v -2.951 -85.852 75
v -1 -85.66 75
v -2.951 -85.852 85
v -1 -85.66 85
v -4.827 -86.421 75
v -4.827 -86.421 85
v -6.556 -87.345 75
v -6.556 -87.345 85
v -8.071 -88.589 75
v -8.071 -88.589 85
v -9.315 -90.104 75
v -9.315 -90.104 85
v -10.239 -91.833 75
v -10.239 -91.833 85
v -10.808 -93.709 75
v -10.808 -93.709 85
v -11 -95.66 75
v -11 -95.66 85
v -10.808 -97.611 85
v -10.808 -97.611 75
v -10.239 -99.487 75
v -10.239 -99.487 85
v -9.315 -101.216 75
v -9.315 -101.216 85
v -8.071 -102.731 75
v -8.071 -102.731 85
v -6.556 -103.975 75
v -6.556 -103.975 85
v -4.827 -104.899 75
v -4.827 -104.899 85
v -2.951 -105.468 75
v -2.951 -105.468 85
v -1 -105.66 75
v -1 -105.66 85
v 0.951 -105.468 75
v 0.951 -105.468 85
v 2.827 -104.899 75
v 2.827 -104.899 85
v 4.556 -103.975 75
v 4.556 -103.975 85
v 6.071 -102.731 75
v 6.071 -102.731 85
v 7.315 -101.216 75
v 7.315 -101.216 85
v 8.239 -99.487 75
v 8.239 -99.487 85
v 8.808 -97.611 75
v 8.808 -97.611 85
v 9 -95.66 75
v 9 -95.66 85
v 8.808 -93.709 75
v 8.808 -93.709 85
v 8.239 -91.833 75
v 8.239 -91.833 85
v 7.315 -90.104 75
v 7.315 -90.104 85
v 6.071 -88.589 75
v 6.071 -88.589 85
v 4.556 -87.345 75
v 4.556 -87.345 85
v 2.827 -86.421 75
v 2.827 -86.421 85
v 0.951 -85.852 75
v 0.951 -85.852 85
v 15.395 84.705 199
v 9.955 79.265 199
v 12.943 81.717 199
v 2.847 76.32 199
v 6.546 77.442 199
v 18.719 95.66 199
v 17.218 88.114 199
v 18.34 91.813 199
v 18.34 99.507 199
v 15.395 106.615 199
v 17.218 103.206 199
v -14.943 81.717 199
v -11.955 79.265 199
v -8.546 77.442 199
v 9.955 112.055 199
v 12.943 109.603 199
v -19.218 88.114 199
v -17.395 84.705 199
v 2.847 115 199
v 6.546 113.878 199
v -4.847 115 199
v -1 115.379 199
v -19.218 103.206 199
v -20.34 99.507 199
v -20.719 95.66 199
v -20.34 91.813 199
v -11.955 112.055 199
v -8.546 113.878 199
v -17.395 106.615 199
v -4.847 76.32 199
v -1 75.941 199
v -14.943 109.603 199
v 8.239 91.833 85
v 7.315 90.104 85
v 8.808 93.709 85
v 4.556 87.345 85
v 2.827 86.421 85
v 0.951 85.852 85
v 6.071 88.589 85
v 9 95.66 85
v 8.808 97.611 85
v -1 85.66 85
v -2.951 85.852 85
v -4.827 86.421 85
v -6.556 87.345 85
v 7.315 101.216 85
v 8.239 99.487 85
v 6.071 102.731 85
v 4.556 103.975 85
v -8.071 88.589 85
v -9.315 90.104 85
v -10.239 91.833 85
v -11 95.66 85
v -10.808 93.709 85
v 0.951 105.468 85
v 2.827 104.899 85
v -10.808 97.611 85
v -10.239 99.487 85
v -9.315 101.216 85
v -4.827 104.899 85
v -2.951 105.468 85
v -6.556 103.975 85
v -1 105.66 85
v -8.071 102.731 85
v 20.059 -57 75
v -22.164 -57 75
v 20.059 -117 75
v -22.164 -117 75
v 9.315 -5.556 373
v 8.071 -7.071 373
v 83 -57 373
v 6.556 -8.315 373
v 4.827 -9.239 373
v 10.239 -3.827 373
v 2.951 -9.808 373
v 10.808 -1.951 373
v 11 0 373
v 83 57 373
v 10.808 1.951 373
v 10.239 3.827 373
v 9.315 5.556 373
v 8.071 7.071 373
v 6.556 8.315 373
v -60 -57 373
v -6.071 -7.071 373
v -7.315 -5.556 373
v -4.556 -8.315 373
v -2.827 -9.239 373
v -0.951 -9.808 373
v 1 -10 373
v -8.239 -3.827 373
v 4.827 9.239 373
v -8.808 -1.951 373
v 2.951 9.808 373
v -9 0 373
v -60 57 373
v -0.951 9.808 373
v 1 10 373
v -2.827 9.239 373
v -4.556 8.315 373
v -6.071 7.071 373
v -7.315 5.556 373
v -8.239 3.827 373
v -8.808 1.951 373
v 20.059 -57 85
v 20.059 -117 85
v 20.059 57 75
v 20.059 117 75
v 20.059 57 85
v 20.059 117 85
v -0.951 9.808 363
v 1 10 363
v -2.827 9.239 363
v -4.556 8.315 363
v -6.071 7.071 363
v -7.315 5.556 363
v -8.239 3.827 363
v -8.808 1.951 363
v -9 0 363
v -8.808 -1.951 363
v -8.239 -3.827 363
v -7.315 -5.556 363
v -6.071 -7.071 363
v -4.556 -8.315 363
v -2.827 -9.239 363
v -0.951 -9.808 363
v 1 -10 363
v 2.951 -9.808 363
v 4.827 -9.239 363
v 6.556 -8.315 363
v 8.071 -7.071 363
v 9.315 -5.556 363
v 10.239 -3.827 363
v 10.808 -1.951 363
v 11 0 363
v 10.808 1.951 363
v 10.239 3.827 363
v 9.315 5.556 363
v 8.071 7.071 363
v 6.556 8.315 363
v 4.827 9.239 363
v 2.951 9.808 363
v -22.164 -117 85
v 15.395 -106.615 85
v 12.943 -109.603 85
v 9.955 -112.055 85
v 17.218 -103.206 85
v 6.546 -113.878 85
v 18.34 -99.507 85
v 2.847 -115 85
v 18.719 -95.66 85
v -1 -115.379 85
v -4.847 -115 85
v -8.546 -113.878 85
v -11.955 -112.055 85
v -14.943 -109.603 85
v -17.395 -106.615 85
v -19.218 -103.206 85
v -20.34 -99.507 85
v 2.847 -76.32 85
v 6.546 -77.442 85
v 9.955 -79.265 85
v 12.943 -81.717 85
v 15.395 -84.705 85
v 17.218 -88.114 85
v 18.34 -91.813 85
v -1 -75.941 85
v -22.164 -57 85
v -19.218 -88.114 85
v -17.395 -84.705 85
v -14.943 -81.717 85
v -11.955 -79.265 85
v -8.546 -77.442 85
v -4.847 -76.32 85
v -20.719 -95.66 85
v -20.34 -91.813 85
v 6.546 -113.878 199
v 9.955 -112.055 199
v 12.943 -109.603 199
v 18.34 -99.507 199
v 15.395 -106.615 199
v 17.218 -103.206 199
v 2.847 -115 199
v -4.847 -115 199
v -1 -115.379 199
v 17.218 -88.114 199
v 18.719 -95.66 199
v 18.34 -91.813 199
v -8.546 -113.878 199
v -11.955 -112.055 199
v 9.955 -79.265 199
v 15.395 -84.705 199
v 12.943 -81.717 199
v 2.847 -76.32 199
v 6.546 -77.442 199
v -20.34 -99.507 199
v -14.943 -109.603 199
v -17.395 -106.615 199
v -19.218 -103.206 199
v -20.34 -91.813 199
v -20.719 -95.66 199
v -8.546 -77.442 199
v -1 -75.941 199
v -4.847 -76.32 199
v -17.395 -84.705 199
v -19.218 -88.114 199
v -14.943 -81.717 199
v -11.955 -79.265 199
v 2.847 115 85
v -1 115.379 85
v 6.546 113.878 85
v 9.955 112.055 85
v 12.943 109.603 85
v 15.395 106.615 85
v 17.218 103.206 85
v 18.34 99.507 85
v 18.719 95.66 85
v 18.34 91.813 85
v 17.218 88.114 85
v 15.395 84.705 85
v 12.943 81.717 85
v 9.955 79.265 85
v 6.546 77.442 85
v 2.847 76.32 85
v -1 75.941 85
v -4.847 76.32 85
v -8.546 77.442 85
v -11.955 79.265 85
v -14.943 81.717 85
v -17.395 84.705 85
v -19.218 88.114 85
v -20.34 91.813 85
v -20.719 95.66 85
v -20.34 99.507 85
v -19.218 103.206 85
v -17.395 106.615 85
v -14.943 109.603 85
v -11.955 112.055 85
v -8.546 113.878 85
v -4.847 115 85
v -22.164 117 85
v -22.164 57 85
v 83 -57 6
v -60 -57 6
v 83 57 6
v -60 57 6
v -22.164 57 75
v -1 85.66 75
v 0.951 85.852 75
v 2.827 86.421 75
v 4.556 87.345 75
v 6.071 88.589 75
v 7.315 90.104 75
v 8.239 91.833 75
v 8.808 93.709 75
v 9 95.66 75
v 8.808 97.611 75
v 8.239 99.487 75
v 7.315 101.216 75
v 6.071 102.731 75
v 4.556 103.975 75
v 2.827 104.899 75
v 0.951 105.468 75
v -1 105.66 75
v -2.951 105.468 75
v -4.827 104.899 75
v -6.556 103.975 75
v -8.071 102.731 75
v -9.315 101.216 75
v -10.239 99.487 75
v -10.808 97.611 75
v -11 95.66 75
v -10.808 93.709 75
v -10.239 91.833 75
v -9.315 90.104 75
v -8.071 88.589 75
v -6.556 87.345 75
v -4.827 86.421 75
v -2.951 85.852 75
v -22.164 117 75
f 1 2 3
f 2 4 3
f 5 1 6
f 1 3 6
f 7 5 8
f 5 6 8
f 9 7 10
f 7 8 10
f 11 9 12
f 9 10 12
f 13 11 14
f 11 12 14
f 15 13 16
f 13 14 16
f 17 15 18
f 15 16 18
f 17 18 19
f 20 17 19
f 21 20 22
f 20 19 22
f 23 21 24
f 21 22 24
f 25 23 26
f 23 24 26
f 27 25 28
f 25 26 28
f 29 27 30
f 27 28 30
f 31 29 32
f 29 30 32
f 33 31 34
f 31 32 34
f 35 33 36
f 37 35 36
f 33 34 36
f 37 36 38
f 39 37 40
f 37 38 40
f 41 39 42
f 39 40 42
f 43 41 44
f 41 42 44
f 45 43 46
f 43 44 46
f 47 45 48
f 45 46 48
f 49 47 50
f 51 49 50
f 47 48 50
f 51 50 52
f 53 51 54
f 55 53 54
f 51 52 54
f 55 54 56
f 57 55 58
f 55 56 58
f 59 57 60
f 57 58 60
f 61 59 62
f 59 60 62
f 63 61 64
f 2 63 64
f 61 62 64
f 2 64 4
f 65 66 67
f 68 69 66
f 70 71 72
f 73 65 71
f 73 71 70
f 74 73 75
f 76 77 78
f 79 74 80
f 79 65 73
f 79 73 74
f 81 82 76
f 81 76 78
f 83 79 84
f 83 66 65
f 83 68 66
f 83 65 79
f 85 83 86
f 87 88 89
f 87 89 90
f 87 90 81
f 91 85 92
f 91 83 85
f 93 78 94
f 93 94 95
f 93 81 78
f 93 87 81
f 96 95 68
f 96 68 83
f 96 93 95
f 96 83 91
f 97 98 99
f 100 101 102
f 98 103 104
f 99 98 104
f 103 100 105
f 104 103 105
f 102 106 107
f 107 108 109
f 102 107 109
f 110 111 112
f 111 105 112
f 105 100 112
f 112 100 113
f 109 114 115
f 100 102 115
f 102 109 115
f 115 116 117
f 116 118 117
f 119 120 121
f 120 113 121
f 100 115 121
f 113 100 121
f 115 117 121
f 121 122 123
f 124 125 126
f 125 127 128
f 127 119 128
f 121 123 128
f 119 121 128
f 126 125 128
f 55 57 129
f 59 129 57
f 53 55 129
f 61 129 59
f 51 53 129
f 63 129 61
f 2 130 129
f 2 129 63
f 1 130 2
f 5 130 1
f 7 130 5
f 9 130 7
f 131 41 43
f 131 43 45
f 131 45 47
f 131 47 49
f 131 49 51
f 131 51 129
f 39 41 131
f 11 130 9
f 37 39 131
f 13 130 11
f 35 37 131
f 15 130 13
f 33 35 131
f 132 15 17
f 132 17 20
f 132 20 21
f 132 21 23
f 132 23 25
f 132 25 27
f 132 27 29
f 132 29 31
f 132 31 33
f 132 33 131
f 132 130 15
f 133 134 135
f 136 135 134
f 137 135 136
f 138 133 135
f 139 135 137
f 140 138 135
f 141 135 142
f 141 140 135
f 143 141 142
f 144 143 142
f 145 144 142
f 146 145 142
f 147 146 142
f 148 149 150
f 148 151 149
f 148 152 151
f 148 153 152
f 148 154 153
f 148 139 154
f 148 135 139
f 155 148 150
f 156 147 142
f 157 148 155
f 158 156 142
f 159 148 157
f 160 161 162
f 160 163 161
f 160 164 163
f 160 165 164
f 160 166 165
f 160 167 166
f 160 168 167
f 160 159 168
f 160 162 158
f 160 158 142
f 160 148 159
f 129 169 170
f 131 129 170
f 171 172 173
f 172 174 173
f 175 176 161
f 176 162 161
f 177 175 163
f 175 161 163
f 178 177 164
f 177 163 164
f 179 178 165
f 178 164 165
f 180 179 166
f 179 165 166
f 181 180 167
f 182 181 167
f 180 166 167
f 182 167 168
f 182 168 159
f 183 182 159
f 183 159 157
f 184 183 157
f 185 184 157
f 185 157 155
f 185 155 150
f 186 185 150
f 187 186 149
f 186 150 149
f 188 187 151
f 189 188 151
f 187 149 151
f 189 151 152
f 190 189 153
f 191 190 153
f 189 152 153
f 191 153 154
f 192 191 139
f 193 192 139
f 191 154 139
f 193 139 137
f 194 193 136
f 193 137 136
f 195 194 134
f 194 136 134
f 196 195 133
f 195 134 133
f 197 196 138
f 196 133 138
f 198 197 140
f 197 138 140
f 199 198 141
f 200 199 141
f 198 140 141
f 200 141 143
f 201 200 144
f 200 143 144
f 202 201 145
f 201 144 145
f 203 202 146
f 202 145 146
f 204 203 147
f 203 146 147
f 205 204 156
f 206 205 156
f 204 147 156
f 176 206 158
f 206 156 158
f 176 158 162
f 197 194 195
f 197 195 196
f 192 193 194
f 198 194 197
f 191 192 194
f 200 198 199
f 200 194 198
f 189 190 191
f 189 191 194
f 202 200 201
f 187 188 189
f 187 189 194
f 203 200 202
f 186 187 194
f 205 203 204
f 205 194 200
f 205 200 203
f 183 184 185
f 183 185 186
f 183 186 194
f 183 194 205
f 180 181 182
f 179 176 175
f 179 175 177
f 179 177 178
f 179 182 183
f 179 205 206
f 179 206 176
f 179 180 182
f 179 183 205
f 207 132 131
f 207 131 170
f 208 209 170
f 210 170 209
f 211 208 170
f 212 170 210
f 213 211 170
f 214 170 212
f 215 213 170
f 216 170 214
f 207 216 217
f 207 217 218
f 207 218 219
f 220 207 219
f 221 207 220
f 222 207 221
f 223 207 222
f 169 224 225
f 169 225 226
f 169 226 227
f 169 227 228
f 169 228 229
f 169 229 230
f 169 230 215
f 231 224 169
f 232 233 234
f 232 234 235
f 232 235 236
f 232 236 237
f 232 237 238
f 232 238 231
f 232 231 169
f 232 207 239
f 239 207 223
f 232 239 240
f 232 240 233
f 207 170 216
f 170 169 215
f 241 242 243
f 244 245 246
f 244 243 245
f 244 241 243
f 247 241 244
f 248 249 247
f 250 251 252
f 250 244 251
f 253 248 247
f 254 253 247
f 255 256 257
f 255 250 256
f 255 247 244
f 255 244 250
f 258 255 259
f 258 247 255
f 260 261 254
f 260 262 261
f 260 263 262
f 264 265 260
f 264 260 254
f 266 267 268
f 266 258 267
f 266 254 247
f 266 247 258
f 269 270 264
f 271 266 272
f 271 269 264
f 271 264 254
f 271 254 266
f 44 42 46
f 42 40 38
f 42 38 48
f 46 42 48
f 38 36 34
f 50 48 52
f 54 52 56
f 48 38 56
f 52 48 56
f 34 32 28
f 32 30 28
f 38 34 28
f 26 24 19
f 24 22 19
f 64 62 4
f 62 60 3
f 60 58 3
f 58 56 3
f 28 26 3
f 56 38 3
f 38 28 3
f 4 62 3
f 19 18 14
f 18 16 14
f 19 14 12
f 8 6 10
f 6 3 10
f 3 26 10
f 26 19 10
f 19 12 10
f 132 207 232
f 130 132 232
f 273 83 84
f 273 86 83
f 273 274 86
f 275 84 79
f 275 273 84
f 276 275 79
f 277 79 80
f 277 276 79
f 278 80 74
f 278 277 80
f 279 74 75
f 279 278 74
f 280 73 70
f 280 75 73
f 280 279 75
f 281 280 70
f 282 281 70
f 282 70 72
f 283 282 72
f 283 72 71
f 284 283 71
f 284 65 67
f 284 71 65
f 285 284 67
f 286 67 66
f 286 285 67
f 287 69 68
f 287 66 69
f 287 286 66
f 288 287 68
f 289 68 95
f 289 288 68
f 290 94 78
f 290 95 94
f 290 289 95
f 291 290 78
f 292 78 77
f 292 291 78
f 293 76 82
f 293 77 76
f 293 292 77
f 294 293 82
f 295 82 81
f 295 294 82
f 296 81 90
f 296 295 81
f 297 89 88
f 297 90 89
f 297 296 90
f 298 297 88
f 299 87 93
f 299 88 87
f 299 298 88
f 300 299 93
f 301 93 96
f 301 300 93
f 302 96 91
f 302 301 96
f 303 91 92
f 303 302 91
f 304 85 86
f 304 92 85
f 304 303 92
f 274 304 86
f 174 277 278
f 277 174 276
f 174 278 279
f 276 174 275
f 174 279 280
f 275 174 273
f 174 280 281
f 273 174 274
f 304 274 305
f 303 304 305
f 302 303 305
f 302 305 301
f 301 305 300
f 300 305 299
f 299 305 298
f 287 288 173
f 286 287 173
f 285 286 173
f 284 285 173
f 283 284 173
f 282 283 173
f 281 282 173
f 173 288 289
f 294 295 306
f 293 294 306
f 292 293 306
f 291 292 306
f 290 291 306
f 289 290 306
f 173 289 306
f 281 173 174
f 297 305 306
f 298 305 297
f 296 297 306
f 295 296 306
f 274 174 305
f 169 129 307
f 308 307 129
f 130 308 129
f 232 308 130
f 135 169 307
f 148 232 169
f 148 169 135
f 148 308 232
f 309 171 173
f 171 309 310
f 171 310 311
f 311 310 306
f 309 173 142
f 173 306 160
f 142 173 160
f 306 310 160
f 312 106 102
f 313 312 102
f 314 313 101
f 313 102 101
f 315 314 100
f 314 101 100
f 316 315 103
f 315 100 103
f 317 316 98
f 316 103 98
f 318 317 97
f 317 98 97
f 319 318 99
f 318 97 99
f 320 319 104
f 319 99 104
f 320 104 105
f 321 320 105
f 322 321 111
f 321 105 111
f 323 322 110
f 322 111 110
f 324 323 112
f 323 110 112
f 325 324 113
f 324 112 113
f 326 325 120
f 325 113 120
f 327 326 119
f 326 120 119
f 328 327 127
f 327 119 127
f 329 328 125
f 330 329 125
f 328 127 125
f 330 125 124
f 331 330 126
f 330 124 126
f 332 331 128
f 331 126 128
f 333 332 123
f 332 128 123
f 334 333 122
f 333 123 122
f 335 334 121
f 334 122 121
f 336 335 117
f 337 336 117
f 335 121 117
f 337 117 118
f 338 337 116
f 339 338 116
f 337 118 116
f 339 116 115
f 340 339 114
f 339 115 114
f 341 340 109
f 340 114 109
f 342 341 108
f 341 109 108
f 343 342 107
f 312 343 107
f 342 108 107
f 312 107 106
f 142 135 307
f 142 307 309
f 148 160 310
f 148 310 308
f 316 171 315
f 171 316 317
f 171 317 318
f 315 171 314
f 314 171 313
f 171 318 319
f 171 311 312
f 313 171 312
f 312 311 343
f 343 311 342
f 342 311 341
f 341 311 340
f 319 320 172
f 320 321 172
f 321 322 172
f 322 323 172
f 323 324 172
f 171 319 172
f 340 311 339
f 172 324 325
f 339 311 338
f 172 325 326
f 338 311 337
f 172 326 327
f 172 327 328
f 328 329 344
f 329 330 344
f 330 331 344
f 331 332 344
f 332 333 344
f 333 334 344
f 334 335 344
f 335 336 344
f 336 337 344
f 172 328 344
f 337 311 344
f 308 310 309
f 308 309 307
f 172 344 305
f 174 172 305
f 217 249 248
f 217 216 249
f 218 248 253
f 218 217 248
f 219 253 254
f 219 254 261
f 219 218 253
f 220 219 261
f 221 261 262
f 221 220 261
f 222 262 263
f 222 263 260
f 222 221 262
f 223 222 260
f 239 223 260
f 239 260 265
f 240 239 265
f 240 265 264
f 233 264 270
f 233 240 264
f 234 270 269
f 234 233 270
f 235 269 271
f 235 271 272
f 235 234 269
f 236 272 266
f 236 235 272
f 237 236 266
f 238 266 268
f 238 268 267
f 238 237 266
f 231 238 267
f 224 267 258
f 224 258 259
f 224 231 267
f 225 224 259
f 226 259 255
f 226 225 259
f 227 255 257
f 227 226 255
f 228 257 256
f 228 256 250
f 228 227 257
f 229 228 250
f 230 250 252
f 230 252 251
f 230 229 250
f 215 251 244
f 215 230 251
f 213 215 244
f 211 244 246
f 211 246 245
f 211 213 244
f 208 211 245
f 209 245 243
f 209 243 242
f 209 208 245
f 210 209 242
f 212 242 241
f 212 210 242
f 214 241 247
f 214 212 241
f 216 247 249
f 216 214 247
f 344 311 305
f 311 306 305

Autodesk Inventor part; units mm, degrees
ref_plane "YZ Plane" through (0, 0, 0) normal (1, 0, 0) x (0, 1, 0)
ref_plane "XZ Plane" through (0, 0, 0) normal (0, 1, 0) x (-1, 0, 0)
ref_plane "XY Plane" through (0, 0, 0) normal (0, 0, 1) x (1, 0, 0)
sketch "Sketch1" plane through (0, 0, 0) normal (0, 0, 1) x (1, 0, 0)
  line L0 (0, -69) -> (57, -69)
  line L1 (57, -69) -> (57, 0)
  line L2 (57, 0) -> (117, 0)
  line L3 (117, 0) -> (117, 10)
  line L4 (117, 10) -> (57, 10)
  line L5 (57, 10) -> (57, 298)
  line L6 (57, 298) -> (0, 298)
  line L7 (0, 298) -> (0, -69) construction
  line L8 (0, -69) -> (-57, -69)
  line L9 (-57, -69) -> (-57, 0)
  line L10 (-57, 0) -> (-117, 0)
  line L11 (-117, 0) -> (-117, 10)
  line L12 (-117, 10) -> (-57, 10)
  line L13 (-57, 10) -> (-57, 298)
  line L14 (-57, 298) -> (0, 298)
  point P0 (0, 0)
  dimension "d0" = 57
  dimension "d2" = 10
  dimension "d18" = 367
  dimension "d19" = 117
  dimension "d47" = 69
extrude "Extrusion1" add sketch "Sketch1" along normal blind 83
sketch "Sketch2" plane through (0, 0, 0) normal (0, 0, -1) x (-1, 0, 0)
  line L0 (57, -69) -> (-57, -69) projected
  line L1 (57, 0) -> (57, -69) projected
  line L2 (117, 0) -> (57, 0) projected
  line L3 (117, 10) -> (117, 0) projected
  line L4 (57, 10) -> (117, 10) projected
  line L5 (57, 298) -> (57, 10) projected
  line L6 (-57, 298) -> (57, 298) projected
  line L7 (-57, 10) -> (-57, 298) projected
  line L8 (-117, 10) -> (-57, 10) projected
  line L9 (-117, 0) -> (-117, 10) projected
  line L10 (-57, 0) -> (-117, 0) projected
  line L11 (-57, -69) -> (-57, 0) projected
  point P0 (0, 0)
extrude "Extrusion2" add sketch "Sketch2" along normal blind 60
sketch "Sketch3" plane through (-57, 298, 83) normal (0, 1, 0) x (1, 0, 0)
  circle A0 centre (57, 82) radius 10
  line L0 (0, 143) -> (114, 143) projected
  line L1 (57, 82) -> (57, 143) construction
  dimension "d10" = 20
  dimension "d51" = 61
extrude "Extrusion3" cut sketch "Sketch3" against normal blind 10
sketch "Sketch4" plane through (-117, 10, 83) normal (0, 1, 0) x (1, 0, 0)
  line L0 (0, 143) -> (60, 143) projected
  line L1 (0, 143) -> (0, 0) projected
  line L2 (21.34, 84) -> (21.34, 143)
  line L3 (118.34, 120.2658) -> (118.34, -20.3509) construction
  line L4 (21.34, 84) -> (118.34, 84) construction
  circle A0 centre (21.34, 84) radius 10
  point P0 (117, 83)
  dimension "d21" = 59
  dimension "d23" = 97
  dimension "d24" = 20
extrude "Extrusion4" cut sketch "Sketch4" against normal through all
mirror "Mirror1" about plane through (0, 0, 0) normal (1, 0, 0) of "Extrusion4"
sketch "Sketch5" plane through (57, 10, 83) normal (0, 1, 0) x (1, 0, 0)
  line L0 (0, 143) -> (0, 0) projected
  line L1 (60, 143) -> (60, 0) projected
  line L2 (60, 143) -> (0, 143)
  line L3 (0, 143) -> (0, 105.1637)
  line L4 (0, 105.1637) -> (60, 105.1637)
  line L5 (60, 105.1637) -> (60, 143)
  line L6 (0, 0) -> (60, 0)
  line L7 (60, 0) -> (60, 62.9414)
  line L8 (60, 62.9414) -> (0, 62.9414)
  line L9 (0, 62.9414) -> (0, 0)
  point P0 (-57, 83)
extrude "Extrusion5" cut sketch "Sketch5" against normal through all contours L2 L1 L4 L0 | L8 L1 L6 L0
mirror "Mirror2" about plane through (0, 0, 0) normal (1, 0, 0) of "Extrusion5"
sketch "Sketch6" plane through (57, 10, -22.1637) normal (0, 1, 0) x (1, 0, 0)
  circle A0 centre (38.66, -21.1637) radius 10 projected
  circle A1 centre (38.66, -21.1637) radius 19.7186
  point P0 (-57, -22.1637)
extrude "Extrusion6" add sketch "Sketch6" along normal blind 114 contours A0 | A1
mirror "Mirror3" about plane through (0, 0, 0) normal (1, 0, 0) of "Extrusion6"
move or copy body "Move Body3" bodies to move or copy 1 copy no rotation origin (0, 0, 0) rotation axis (0, 1, 0) rotation angle 90
move or copy body "Move Body4" bodies to move or copy 1 copy no rotation origin (0, 0, 0) rotation axis (1, 0, 0) rotation angle 90
move or copy body "Move Body8" bodies to move or copy 1 copy no translate (0, 0, 75)
properties part number "LowerTorso_v2"
